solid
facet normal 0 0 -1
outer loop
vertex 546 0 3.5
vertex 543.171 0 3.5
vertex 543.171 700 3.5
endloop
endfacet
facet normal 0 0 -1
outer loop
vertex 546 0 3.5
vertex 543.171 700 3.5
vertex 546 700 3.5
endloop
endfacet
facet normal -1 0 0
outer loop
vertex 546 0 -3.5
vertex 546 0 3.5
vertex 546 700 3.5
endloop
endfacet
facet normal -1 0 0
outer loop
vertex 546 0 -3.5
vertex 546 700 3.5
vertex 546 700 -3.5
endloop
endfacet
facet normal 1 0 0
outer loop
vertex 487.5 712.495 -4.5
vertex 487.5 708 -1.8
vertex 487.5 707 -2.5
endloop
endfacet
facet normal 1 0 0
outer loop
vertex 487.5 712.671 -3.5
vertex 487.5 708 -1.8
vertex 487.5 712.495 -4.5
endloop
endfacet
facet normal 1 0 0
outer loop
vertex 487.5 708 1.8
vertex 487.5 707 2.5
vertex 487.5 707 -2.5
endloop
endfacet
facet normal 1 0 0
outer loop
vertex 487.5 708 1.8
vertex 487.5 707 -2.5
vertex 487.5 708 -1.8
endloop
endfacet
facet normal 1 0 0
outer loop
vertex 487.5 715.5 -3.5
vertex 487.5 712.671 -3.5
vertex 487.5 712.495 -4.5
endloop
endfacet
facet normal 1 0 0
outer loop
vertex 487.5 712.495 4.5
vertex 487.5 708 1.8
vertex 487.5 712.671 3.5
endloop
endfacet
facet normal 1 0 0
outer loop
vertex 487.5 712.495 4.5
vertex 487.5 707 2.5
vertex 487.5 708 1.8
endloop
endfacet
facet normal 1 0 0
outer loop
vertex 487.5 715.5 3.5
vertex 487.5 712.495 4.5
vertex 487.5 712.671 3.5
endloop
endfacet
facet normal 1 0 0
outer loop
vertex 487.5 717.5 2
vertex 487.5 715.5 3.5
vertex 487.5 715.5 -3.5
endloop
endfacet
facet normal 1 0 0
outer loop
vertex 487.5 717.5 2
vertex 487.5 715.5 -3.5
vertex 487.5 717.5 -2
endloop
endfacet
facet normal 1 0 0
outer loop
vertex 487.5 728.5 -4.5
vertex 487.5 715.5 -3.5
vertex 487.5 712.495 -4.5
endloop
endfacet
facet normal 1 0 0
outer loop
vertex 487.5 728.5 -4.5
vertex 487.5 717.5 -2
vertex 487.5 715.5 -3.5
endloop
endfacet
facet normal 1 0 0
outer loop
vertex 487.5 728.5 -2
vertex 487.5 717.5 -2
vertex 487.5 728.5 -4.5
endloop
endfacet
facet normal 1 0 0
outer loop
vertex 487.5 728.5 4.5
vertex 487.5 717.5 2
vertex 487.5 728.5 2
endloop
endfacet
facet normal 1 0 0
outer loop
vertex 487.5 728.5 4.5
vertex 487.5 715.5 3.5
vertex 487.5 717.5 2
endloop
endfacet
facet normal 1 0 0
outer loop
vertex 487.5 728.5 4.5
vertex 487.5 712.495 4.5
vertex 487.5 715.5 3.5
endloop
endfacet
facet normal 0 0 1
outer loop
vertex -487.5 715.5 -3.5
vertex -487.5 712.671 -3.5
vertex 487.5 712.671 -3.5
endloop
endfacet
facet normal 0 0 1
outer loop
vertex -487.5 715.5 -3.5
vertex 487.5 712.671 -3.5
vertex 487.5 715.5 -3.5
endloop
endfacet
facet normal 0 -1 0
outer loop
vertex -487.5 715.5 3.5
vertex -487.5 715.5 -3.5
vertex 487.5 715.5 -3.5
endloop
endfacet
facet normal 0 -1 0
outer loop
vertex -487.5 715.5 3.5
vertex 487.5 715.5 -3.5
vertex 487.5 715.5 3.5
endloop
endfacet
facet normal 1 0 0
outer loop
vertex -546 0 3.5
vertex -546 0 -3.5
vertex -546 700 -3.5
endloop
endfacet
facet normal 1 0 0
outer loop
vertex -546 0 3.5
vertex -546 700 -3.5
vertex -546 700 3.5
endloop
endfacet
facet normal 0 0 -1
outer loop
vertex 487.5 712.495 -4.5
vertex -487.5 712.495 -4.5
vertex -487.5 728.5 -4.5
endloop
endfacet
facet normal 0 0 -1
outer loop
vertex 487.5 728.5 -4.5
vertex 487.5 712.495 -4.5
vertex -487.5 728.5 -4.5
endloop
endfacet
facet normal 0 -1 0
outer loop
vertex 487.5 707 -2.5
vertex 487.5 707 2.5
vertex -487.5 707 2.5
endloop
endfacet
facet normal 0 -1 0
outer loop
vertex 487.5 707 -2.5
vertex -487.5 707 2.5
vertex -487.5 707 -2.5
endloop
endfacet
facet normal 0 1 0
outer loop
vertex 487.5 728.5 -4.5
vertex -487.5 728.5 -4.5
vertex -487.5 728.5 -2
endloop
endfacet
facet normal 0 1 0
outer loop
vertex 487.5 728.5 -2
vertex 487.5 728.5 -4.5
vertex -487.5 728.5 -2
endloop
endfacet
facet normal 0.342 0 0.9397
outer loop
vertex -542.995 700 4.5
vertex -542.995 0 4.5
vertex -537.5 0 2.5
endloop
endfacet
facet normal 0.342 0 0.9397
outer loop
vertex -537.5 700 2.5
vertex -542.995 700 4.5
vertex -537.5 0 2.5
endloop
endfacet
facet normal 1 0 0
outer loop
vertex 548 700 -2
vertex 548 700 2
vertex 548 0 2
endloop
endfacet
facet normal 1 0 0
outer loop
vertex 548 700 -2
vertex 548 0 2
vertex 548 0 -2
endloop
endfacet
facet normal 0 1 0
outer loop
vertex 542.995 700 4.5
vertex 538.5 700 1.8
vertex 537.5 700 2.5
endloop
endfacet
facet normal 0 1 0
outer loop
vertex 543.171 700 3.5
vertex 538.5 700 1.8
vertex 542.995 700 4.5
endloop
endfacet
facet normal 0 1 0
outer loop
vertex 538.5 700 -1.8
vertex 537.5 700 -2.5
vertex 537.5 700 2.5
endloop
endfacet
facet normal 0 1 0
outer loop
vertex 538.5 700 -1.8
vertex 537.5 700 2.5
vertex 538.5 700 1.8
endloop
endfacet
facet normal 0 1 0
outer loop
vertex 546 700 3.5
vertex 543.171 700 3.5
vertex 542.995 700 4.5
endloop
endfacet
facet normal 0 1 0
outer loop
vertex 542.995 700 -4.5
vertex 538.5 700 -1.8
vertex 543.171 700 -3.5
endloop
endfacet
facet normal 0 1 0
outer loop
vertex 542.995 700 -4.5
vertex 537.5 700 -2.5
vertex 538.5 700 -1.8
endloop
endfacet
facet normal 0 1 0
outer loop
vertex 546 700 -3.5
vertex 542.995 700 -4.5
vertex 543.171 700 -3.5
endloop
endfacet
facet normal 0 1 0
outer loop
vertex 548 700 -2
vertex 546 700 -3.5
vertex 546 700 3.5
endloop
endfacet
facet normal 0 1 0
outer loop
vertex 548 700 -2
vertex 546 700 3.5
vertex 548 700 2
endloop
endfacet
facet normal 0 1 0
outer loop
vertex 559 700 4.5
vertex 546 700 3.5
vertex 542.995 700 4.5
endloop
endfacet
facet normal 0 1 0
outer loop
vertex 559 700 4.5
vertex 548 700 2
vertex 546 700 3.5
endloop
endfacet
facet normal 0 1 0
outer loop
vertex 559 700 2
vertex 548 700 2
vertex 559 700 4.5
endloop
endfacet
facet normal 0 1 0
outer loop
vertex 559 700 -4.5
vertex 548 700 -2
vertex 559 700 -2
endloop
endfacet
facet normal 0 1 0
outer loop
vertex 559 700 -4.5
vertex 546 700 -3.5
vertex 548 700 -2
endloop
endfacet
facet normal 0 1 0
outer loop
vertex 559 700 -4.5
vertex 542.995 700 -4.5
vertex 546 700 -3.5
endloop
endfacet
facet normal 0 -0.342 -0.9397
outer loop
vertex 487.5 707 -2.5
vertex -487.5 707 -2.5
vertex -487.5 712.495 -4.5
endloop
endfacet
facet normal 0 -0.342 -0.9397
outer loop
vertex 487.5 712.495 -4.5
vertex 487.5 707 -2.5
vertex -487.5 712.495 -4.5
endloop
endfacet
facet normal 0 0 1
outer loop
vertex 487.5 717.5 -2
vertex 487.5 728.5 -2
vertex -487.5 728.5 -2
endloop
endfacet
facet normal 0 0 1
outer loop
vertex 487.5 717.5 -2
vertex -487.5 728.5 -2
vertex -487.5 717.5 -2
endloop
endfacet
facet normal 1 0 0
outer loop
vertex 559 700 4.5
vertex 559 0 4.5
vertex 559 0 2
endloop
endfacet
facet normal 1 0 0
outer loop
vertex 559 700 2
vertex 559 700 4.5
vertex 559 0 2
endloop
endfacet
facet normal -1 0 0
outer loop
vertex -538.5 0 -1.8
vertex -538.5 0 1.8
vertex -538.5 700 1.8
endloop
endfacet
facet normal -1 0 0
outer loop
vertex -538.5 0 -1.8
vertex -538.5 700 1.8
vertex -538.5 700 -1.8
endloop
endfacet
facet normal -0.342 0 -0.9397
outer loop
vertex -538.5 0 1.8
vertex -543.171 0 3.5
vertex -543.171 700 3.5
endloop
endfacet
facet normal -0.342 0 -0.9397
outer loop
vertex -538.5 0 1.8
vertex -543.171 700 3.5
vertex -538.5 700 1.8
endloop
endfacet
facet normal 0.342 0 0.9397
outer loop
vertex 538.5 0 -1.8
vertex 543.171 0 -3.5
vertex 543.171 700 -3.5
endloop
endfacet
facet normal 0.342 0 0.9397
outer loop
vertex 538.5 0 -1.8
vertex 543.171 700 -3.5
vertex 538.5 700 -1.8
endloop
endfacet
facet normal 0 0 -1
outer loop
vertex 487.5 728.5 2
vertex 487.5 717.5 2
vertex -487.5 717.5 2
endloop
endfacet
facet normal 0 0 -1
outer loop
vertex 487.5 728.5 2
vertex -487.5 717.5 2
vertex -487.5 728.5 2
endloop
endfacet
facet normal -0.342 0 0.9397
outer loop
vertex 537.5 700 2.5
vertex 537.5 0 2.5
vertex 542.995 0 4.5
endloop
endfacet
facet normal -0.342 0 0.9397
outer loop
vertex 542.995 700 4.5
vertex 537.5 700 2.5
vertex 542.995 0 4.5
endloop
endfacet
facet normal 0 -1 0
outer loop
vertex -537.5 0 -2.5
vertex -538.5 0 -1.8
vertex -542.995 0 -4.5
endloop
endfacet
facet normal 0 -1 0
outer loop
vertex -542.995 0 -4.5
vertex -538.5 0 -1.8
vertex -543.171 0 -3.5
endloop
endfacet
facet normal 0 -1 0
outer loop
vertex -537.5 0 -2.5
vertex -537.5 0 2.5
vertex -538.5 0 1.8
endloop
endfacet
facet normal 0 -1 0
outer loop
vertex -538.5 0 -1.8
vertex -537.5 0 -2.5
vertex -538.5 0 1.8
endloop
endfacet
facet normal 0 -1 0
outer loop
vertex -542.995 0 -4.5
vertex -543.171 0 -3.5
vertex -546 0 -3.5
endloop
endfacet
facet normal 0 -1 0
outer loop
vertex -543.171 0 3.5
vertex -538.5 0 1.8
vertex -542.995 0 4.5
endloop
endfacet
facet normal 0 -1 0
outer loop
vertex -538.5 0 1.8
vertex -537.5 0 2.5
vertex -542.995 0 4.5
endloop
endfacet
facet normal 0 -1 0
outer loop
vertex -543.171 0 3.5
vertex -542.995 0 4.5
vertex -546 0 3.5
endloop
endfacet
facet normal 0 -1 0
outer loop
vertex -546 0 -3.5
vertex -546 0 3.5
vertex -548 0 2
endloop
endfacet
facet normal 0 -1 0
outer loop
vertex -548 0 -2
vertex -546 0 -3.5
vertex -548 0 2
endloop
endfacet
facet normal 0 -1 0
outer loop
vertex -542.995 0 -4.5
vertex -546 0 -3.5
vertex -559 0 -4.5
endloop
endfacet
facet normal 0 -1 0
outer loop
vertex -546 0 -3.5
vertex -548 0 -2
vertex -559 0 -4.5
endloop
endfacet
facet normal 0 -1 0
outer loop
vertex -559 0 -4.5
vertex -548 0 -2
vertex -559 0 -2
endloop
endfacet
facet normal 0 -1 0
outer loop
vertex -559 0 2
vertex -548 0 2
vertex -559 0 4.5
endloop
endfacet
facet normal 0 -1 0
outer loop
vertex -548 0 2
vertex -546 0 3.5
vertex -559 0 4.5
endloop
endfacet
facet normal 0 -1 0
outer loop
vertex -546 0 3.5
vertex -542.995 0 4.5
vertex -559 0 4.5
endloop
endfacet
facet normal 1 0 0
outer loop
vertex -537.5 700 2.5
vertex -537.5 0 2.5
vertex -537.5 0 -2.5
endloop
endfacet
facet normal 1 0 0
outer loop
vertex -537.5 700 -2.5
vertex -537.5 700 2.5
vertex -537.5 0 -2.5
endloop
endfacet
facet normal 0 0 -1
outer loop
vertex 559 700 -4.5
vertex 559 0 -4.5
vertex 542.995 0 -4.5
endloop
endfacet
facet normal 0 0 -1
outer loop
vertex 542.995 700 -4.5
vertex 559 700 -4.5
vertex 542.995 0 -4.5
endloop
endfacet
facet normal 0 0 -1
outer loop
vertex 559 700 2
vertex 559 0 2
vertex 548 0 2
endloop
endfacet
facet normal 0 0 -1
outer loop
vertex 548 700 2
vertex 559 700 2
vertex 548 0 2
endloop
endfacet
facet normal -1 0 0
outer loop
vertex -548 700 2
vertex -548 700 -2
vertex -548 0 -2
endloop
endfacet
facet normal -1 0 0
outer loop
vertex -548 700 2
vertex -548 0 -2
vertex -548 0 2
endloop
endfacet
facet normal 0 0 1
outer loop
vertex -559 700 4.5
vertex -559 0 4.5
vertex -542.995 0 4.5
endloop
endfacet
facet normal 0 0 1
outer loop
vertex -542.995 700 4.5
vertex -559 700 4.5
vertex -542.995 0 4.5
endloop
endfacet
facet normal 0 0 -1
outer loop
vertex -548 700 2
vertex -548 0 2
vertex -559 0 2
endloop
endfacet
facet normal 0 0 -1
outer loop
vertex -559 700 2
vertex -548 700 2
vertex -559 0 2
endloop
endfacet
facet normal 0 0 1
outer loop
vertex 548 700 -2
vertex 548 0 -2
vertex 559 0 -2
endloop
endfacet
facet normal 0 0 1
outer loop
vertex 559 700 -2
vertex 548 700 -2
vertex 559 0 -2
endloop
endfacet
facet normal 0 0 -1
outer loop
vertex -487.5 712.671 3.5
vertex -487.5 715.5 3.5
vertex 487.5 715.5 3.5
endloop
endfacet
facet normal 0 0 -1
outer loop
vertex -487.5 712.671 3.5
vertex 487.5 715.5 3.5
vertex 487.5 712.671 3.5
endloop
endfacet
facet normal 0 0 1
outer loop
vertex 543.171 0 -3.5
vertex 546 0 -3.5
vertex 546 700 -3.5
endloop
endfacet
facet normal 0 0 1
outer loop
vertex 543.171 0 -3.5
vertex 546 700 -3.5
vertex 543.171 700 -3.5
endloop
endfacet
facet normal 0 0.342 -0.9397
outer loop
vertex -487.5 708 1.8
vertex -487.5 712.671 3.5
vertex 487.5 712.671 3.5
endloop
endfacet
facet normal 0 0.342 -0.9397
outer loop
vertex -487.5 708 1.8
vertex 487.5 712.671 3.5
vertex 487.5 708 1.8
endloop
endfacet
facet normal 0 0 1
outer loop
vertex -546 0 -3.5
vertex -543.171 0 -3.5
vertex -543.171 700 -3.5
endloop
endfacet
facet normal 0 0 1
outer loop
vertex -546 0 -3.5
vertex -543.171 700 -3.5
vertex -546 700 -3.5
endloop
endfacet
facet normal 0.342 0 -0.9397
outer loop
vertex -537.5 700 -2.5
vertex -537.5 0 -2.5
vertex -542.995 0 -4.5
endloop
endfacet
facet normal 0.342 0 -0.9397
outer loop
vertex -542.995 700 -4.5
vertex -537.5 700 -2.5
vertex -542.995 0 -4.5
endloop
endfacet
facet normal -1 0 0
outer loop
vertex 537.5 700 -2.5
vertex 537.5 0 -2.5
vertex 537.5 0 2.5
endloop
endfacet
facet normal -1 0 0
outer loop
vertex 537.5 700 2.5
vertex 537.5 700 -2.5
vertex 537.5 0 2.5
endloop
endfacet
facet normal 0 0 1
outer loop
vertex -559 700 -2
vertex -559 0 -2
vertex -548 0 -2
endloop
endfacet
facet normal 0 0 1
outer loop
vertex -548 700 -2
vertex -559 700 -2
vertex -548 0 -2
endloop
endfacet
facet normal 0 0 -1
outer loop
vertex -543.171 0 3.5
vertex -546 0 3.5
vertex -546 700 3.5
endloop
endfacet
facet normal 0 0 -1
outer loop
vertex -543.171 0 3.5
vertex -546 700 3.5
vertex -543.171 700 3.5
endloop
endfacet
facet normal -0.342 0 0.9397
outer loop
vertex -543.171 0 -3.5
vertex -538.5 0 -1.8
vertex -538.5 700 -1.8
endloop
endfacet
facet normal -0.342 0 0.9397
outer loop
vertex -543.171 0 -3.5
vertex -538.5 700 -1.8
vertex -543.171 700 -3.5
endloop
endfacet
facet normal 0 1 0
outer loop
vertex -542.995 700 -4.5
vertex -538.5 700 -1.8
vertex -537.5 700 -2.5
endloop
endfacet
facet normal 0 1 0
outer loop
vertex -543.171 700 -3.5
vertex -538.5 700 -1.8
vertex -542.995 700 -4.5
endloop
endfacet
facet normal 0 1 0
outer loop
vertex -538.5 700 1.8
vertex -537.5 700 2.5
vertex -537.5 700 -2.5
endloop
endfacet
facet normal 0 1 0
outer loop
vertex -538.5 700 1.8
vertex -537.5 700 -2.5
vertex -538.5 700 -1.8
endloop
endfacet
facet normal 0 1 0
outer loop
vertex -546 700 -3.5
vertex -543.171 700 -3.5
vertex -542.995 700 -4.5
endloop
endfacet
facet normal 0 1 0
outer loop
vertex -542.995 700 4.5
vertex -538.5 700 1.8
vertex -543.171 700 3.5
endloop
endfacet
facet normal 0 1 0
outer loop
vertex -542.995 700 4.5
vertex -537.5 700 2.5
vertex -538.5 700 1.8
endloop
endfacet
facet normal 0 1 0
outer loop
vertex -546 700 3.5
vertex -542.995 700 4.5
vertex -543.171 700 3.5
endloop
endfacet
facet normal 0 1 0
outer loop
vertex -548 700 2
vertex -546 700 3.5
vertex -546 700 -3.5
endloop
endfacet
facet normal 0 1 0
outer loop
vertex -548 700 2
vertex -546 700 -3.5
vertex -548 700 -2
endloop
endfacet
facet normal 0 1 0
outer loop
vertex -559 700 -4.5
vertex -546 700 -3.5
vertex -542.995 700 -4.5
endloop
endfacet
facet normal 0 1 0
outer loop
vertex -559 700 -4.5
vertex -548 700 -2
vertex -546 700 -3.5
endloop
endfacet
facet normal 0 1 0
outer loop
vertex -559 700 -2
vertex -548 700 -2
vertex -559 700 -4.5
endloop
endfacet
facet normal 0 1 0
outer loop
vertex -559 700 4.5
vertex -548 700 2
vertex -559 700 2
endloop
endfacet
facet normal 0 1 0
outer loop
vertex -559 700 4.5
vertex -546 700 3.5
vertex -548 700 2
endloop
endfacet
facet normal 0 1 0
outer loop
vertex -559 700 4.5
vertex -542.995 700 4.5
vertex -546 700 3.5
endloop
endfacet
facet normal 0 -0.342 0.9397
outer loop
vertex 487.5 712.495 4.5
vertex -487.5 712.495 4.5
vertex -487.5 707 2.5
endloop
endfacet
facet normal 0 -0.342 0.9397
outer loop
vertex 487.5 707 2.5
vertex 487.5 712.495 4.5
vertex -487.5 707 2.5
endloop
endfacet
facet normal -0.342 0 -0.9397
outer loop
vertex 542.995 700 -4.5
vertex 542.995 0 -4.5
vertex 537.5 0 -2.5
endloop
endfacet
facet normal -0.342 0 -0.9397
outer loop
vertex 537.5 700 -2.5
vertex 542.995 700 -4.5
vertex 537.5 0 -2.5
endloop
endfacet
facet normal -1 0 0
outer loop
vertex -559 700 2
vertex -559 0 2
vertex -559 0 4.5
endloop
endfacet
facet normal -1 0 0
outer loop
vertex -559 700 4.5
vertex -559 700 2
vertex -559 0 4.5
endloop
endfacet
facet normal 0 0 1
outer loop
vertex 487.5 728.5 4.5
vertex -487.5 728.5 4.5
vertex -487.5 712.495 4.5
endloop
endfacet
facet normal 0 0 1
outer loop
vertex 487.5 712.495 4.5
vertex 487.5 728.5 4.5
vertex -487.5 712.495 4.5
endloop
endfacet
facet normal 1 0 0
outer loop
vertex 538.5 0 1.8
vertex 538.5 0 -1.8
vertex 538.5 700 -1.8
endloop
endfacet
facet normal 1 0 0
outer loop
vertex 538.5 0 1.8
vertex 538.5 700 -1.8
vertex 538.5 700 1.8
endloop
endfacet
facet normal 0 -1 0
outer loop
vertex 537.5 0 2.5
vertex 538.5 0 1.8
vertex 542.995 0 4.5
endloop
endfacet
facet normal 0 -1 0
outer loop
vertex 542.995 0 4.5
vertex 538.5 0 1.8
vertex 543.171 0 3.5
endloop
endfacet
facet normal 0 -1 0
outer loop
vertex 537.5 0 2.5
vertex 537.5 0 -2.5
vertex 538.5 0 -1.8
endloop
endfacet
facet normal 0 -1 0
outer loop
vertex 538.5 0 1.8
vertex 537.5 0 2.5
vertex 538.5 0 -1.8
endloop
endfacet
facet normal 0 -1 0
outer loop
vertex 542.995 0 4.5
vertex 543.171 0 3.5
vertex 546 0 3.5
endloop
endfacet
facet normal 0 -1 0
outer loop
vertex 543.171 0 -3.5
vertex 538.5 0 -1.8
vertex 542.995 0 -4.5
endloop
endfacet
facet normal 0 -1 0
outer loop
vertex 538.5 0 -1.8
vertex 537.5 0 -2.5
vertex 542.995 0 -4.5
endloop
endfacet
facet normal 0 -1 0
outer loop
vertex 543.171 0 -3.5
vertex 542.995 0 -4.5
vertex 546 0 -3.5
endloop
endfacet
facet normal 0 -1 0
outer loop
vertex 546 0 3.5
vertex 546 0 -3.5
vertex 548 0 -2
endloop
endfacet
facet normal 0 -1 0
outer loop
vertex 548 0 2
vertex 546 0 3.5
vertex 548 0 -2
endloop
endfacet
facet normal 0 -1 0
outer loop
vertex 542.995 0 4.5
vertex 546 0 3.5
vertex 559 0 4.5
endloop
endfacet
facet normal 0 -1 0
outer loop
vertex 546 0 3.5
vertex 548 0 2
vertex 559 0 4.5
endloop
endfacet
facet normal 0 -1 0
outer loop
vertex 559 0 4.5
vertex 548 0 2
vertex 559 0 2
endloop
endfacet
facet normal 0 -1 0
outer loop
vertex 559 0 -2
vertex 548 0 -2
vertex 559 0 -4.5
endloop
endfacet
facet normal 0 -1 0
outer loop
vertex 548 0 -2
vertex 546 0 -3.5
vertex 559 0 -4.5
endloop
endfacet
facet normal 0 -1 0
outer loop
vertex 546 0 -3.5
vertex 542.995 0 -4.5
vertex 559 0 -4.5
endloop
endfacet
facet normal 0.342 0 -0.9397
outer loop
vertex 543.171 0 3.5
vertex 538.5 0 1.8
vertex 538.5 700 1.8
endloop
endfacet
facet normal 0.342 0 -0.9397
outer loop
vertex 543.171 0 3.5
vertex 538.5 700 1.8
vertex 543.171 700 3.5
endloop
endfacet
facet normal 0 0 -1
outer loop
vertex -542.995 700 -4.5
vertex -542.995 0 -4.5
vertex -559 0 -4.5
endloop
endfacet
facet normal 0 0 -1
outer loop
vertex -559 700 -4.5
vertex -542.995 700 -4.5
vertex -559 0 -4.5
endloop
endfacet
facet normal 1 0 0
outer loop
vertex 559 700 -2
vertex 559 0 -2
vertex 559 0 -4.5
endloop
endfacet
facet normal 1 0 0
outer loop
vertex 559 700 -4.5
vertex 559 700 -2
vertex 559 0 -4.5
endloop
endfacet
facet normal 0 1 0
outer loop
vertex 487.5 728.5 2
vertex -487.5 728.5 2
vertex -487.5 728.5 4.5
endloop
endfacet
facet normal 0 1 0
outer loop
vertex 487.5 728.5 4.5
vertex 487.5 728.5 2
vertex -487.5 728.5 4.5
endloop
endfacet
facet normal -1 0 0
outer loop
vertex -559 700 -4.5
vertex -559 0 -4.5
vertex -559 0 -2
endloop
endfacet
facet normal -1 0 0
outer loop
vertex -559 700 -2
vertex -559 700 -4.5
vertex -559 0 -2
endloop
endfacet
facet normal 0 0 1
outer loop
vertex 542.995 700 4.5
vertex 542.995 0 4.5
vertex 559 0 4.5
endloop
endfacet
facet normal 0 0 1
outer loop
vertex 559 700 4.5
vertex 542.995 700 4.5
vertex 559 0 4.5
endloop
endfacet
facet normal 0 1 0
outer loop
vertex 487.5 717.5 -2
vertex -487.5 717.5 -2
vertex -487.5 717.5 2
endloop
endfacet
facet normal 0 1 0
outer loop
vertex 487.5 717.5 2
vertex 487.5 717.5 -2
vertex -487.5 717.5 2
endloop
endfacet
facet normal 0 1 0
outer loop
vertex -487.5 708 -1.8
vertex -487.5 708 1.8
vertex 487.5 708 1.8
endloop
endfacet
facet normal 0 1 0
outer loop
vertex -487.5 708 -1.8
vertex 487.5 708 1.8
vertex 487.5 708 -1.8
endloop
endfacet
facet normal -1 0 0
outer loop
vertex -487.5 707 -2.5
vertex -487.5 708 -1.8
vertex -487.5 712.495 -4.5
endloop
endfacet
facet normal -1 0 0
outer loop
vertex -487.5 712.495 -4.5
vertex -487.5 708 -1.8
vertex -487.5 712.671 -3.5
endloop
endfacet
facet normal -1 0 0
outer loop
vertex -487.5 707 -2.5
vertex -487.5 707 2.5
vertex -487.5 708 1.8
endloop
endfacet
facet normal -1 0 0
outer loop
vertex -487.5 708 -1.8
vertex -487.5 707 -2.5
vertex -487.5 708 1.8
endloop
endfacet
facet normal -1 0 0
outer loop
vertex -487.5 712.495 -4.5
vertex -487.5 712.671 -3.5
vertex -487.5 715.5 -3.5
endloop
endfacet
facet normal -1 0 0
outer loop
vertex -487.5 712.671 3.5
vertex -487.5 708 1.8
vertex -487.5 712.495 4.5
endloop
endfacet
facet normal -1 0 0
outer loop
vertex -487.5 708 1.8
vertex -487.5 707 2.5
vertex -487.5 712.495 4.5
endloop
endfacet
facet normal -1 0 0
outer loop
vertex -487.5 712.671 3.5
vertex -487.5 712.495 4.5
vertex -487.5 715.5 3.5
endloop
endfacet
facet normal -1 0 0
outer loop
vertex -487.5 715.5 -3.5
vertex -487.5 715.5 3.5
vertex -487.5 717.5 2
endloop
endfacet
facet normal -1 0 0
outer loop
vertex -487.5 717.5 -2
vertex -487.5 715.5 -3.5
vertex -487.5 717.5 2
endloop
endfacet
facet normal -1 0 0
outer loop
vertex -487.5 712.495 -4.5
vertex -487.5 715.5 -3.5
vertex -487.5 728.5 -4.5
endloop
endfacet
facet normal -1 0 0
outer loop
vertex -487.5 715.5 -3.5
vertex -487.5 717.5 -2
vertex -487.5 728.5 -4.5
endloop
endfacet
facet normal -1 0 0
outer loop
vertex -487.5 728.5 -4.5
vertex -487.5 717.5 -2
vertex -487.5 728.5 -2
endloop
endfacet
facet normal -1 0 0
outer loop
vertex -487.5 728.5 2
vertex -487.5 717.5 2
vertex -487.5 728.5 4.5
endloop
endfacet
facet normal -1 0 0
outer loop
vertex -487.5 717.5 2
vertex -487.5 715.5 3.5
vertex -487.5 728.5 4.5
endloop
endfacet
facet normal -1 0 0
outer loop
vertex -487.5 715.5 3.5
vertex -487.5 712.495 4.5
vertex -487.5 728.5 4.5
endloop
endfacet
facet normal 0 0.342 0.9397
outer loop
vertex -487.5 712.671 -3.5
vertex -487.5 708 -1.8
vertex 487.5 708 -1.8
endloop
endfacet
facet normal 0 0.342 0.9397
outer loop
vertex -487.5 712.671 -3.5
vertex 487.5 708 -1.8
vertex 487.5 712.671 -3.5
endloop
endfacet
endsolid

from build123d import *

# Parameters (mm, degrees)
JOINT_99168010_JOINT_DE_CARROSSERIE_1_DEPTH   = 700
JOINT_99168010_JOINT_DE_CARROSSERIE_1_2_DEPTH = 975
JOINT_99168010_JOINT_DE_CARROSSERIE_1_3_DEPTH = 700


with BuildPart() as part:
    # Sketch1 → Joint 99168010 JOINT DE CARROSSERIE(1) (new body)
    with BuildSketch(Plane(origin=(-548, 0, 0), x_dir=(-1, 0, 0), z_dir=(0, 1, 0))):
        Polygon((11, 4.5), (-5.005045161, 4.5), (-10.5, 2.5), (-10.5, -2.5), (-5.005045161, -4.5), (11, -4.5), (11, -2), (0, -2), (0, 2), (11, 2), align=None)
        Polygon((-4.82871818, 3.5), (-9.5, 1.799792462), (-9.5, -1.799792462), (-4.82871818, -3.5), (-2, -3.5), (-2, 3.5), align=None, mode=Mode.SUBTRACT)
    extrude(amount=JOINT_99168010_JOINT_DE_CARROSSERIE_1_DEPTH)


with BuildPart() as body_2:
    # Sketch1 on segment 2 (carried to segment 2) → Joint 99168010 JOINT DE CARROSSERIE_1 2 (new body)
    with BuildSketch(Plane(origin=(-487.5, 717.5, 0), x_dir=(0, 1, 0), z_dir=(1, 0, 0))):
        Polygon((11, 4.5), (-5.005045161, 4.5), (-10.5, 2.5), (-10.5, -2.5), (-5.005045161, -4.5), (11, -4.5), (11, -2), (0, -2), (0, 2), (11, 2), align=None)
        Polygon((-4.82871818, 3.5), (-9.5, 1.799792462), (-9.5, -1.799792462), (-4.82871818, -3.5), (-2, -3.5), (-2, 3.5), align=None, mode=Mode.SUBTRACT)
    extrude(amount=JOINT_99168010_JOINT_DE_CARROSSERIE_1_2_DEPTH)


with BuildPart() as body_3:
    # Sketch1 on segment 3 (carried to segment 3) → Joint 99168010 JOINT DE CARROSSERIE_1 3 (new body)
    with BuildSketch(Plane(origin=(548, 0, 0), x_dir=(1, 0, 0), z_dir=(0, 1, 0))):
        Polygon((11, 4.5), (-5.005045161, 4.5), (-10.5, 2.5), (-10.5, -2.5), (-5.005045161, -4.5), (11, -4.5), (11, -2), (0, -2), (0, 2), (11, 2), align=None)
        Polygon((-4.82871818, 3.5), (-9.5, 1.799792462), (-9.5, -1.799792462), (-4.82871818, -3.5), (-2, -3.5), (-2, 3.5), align=None, mode=Mode.SUBTRACT)
    extrude(amount=JOINT_99168010_JOINT_DE_CARROSSERIE_1_3_DEPTH)


solid = Compound([part.part, body_2.part, body_3.part])
